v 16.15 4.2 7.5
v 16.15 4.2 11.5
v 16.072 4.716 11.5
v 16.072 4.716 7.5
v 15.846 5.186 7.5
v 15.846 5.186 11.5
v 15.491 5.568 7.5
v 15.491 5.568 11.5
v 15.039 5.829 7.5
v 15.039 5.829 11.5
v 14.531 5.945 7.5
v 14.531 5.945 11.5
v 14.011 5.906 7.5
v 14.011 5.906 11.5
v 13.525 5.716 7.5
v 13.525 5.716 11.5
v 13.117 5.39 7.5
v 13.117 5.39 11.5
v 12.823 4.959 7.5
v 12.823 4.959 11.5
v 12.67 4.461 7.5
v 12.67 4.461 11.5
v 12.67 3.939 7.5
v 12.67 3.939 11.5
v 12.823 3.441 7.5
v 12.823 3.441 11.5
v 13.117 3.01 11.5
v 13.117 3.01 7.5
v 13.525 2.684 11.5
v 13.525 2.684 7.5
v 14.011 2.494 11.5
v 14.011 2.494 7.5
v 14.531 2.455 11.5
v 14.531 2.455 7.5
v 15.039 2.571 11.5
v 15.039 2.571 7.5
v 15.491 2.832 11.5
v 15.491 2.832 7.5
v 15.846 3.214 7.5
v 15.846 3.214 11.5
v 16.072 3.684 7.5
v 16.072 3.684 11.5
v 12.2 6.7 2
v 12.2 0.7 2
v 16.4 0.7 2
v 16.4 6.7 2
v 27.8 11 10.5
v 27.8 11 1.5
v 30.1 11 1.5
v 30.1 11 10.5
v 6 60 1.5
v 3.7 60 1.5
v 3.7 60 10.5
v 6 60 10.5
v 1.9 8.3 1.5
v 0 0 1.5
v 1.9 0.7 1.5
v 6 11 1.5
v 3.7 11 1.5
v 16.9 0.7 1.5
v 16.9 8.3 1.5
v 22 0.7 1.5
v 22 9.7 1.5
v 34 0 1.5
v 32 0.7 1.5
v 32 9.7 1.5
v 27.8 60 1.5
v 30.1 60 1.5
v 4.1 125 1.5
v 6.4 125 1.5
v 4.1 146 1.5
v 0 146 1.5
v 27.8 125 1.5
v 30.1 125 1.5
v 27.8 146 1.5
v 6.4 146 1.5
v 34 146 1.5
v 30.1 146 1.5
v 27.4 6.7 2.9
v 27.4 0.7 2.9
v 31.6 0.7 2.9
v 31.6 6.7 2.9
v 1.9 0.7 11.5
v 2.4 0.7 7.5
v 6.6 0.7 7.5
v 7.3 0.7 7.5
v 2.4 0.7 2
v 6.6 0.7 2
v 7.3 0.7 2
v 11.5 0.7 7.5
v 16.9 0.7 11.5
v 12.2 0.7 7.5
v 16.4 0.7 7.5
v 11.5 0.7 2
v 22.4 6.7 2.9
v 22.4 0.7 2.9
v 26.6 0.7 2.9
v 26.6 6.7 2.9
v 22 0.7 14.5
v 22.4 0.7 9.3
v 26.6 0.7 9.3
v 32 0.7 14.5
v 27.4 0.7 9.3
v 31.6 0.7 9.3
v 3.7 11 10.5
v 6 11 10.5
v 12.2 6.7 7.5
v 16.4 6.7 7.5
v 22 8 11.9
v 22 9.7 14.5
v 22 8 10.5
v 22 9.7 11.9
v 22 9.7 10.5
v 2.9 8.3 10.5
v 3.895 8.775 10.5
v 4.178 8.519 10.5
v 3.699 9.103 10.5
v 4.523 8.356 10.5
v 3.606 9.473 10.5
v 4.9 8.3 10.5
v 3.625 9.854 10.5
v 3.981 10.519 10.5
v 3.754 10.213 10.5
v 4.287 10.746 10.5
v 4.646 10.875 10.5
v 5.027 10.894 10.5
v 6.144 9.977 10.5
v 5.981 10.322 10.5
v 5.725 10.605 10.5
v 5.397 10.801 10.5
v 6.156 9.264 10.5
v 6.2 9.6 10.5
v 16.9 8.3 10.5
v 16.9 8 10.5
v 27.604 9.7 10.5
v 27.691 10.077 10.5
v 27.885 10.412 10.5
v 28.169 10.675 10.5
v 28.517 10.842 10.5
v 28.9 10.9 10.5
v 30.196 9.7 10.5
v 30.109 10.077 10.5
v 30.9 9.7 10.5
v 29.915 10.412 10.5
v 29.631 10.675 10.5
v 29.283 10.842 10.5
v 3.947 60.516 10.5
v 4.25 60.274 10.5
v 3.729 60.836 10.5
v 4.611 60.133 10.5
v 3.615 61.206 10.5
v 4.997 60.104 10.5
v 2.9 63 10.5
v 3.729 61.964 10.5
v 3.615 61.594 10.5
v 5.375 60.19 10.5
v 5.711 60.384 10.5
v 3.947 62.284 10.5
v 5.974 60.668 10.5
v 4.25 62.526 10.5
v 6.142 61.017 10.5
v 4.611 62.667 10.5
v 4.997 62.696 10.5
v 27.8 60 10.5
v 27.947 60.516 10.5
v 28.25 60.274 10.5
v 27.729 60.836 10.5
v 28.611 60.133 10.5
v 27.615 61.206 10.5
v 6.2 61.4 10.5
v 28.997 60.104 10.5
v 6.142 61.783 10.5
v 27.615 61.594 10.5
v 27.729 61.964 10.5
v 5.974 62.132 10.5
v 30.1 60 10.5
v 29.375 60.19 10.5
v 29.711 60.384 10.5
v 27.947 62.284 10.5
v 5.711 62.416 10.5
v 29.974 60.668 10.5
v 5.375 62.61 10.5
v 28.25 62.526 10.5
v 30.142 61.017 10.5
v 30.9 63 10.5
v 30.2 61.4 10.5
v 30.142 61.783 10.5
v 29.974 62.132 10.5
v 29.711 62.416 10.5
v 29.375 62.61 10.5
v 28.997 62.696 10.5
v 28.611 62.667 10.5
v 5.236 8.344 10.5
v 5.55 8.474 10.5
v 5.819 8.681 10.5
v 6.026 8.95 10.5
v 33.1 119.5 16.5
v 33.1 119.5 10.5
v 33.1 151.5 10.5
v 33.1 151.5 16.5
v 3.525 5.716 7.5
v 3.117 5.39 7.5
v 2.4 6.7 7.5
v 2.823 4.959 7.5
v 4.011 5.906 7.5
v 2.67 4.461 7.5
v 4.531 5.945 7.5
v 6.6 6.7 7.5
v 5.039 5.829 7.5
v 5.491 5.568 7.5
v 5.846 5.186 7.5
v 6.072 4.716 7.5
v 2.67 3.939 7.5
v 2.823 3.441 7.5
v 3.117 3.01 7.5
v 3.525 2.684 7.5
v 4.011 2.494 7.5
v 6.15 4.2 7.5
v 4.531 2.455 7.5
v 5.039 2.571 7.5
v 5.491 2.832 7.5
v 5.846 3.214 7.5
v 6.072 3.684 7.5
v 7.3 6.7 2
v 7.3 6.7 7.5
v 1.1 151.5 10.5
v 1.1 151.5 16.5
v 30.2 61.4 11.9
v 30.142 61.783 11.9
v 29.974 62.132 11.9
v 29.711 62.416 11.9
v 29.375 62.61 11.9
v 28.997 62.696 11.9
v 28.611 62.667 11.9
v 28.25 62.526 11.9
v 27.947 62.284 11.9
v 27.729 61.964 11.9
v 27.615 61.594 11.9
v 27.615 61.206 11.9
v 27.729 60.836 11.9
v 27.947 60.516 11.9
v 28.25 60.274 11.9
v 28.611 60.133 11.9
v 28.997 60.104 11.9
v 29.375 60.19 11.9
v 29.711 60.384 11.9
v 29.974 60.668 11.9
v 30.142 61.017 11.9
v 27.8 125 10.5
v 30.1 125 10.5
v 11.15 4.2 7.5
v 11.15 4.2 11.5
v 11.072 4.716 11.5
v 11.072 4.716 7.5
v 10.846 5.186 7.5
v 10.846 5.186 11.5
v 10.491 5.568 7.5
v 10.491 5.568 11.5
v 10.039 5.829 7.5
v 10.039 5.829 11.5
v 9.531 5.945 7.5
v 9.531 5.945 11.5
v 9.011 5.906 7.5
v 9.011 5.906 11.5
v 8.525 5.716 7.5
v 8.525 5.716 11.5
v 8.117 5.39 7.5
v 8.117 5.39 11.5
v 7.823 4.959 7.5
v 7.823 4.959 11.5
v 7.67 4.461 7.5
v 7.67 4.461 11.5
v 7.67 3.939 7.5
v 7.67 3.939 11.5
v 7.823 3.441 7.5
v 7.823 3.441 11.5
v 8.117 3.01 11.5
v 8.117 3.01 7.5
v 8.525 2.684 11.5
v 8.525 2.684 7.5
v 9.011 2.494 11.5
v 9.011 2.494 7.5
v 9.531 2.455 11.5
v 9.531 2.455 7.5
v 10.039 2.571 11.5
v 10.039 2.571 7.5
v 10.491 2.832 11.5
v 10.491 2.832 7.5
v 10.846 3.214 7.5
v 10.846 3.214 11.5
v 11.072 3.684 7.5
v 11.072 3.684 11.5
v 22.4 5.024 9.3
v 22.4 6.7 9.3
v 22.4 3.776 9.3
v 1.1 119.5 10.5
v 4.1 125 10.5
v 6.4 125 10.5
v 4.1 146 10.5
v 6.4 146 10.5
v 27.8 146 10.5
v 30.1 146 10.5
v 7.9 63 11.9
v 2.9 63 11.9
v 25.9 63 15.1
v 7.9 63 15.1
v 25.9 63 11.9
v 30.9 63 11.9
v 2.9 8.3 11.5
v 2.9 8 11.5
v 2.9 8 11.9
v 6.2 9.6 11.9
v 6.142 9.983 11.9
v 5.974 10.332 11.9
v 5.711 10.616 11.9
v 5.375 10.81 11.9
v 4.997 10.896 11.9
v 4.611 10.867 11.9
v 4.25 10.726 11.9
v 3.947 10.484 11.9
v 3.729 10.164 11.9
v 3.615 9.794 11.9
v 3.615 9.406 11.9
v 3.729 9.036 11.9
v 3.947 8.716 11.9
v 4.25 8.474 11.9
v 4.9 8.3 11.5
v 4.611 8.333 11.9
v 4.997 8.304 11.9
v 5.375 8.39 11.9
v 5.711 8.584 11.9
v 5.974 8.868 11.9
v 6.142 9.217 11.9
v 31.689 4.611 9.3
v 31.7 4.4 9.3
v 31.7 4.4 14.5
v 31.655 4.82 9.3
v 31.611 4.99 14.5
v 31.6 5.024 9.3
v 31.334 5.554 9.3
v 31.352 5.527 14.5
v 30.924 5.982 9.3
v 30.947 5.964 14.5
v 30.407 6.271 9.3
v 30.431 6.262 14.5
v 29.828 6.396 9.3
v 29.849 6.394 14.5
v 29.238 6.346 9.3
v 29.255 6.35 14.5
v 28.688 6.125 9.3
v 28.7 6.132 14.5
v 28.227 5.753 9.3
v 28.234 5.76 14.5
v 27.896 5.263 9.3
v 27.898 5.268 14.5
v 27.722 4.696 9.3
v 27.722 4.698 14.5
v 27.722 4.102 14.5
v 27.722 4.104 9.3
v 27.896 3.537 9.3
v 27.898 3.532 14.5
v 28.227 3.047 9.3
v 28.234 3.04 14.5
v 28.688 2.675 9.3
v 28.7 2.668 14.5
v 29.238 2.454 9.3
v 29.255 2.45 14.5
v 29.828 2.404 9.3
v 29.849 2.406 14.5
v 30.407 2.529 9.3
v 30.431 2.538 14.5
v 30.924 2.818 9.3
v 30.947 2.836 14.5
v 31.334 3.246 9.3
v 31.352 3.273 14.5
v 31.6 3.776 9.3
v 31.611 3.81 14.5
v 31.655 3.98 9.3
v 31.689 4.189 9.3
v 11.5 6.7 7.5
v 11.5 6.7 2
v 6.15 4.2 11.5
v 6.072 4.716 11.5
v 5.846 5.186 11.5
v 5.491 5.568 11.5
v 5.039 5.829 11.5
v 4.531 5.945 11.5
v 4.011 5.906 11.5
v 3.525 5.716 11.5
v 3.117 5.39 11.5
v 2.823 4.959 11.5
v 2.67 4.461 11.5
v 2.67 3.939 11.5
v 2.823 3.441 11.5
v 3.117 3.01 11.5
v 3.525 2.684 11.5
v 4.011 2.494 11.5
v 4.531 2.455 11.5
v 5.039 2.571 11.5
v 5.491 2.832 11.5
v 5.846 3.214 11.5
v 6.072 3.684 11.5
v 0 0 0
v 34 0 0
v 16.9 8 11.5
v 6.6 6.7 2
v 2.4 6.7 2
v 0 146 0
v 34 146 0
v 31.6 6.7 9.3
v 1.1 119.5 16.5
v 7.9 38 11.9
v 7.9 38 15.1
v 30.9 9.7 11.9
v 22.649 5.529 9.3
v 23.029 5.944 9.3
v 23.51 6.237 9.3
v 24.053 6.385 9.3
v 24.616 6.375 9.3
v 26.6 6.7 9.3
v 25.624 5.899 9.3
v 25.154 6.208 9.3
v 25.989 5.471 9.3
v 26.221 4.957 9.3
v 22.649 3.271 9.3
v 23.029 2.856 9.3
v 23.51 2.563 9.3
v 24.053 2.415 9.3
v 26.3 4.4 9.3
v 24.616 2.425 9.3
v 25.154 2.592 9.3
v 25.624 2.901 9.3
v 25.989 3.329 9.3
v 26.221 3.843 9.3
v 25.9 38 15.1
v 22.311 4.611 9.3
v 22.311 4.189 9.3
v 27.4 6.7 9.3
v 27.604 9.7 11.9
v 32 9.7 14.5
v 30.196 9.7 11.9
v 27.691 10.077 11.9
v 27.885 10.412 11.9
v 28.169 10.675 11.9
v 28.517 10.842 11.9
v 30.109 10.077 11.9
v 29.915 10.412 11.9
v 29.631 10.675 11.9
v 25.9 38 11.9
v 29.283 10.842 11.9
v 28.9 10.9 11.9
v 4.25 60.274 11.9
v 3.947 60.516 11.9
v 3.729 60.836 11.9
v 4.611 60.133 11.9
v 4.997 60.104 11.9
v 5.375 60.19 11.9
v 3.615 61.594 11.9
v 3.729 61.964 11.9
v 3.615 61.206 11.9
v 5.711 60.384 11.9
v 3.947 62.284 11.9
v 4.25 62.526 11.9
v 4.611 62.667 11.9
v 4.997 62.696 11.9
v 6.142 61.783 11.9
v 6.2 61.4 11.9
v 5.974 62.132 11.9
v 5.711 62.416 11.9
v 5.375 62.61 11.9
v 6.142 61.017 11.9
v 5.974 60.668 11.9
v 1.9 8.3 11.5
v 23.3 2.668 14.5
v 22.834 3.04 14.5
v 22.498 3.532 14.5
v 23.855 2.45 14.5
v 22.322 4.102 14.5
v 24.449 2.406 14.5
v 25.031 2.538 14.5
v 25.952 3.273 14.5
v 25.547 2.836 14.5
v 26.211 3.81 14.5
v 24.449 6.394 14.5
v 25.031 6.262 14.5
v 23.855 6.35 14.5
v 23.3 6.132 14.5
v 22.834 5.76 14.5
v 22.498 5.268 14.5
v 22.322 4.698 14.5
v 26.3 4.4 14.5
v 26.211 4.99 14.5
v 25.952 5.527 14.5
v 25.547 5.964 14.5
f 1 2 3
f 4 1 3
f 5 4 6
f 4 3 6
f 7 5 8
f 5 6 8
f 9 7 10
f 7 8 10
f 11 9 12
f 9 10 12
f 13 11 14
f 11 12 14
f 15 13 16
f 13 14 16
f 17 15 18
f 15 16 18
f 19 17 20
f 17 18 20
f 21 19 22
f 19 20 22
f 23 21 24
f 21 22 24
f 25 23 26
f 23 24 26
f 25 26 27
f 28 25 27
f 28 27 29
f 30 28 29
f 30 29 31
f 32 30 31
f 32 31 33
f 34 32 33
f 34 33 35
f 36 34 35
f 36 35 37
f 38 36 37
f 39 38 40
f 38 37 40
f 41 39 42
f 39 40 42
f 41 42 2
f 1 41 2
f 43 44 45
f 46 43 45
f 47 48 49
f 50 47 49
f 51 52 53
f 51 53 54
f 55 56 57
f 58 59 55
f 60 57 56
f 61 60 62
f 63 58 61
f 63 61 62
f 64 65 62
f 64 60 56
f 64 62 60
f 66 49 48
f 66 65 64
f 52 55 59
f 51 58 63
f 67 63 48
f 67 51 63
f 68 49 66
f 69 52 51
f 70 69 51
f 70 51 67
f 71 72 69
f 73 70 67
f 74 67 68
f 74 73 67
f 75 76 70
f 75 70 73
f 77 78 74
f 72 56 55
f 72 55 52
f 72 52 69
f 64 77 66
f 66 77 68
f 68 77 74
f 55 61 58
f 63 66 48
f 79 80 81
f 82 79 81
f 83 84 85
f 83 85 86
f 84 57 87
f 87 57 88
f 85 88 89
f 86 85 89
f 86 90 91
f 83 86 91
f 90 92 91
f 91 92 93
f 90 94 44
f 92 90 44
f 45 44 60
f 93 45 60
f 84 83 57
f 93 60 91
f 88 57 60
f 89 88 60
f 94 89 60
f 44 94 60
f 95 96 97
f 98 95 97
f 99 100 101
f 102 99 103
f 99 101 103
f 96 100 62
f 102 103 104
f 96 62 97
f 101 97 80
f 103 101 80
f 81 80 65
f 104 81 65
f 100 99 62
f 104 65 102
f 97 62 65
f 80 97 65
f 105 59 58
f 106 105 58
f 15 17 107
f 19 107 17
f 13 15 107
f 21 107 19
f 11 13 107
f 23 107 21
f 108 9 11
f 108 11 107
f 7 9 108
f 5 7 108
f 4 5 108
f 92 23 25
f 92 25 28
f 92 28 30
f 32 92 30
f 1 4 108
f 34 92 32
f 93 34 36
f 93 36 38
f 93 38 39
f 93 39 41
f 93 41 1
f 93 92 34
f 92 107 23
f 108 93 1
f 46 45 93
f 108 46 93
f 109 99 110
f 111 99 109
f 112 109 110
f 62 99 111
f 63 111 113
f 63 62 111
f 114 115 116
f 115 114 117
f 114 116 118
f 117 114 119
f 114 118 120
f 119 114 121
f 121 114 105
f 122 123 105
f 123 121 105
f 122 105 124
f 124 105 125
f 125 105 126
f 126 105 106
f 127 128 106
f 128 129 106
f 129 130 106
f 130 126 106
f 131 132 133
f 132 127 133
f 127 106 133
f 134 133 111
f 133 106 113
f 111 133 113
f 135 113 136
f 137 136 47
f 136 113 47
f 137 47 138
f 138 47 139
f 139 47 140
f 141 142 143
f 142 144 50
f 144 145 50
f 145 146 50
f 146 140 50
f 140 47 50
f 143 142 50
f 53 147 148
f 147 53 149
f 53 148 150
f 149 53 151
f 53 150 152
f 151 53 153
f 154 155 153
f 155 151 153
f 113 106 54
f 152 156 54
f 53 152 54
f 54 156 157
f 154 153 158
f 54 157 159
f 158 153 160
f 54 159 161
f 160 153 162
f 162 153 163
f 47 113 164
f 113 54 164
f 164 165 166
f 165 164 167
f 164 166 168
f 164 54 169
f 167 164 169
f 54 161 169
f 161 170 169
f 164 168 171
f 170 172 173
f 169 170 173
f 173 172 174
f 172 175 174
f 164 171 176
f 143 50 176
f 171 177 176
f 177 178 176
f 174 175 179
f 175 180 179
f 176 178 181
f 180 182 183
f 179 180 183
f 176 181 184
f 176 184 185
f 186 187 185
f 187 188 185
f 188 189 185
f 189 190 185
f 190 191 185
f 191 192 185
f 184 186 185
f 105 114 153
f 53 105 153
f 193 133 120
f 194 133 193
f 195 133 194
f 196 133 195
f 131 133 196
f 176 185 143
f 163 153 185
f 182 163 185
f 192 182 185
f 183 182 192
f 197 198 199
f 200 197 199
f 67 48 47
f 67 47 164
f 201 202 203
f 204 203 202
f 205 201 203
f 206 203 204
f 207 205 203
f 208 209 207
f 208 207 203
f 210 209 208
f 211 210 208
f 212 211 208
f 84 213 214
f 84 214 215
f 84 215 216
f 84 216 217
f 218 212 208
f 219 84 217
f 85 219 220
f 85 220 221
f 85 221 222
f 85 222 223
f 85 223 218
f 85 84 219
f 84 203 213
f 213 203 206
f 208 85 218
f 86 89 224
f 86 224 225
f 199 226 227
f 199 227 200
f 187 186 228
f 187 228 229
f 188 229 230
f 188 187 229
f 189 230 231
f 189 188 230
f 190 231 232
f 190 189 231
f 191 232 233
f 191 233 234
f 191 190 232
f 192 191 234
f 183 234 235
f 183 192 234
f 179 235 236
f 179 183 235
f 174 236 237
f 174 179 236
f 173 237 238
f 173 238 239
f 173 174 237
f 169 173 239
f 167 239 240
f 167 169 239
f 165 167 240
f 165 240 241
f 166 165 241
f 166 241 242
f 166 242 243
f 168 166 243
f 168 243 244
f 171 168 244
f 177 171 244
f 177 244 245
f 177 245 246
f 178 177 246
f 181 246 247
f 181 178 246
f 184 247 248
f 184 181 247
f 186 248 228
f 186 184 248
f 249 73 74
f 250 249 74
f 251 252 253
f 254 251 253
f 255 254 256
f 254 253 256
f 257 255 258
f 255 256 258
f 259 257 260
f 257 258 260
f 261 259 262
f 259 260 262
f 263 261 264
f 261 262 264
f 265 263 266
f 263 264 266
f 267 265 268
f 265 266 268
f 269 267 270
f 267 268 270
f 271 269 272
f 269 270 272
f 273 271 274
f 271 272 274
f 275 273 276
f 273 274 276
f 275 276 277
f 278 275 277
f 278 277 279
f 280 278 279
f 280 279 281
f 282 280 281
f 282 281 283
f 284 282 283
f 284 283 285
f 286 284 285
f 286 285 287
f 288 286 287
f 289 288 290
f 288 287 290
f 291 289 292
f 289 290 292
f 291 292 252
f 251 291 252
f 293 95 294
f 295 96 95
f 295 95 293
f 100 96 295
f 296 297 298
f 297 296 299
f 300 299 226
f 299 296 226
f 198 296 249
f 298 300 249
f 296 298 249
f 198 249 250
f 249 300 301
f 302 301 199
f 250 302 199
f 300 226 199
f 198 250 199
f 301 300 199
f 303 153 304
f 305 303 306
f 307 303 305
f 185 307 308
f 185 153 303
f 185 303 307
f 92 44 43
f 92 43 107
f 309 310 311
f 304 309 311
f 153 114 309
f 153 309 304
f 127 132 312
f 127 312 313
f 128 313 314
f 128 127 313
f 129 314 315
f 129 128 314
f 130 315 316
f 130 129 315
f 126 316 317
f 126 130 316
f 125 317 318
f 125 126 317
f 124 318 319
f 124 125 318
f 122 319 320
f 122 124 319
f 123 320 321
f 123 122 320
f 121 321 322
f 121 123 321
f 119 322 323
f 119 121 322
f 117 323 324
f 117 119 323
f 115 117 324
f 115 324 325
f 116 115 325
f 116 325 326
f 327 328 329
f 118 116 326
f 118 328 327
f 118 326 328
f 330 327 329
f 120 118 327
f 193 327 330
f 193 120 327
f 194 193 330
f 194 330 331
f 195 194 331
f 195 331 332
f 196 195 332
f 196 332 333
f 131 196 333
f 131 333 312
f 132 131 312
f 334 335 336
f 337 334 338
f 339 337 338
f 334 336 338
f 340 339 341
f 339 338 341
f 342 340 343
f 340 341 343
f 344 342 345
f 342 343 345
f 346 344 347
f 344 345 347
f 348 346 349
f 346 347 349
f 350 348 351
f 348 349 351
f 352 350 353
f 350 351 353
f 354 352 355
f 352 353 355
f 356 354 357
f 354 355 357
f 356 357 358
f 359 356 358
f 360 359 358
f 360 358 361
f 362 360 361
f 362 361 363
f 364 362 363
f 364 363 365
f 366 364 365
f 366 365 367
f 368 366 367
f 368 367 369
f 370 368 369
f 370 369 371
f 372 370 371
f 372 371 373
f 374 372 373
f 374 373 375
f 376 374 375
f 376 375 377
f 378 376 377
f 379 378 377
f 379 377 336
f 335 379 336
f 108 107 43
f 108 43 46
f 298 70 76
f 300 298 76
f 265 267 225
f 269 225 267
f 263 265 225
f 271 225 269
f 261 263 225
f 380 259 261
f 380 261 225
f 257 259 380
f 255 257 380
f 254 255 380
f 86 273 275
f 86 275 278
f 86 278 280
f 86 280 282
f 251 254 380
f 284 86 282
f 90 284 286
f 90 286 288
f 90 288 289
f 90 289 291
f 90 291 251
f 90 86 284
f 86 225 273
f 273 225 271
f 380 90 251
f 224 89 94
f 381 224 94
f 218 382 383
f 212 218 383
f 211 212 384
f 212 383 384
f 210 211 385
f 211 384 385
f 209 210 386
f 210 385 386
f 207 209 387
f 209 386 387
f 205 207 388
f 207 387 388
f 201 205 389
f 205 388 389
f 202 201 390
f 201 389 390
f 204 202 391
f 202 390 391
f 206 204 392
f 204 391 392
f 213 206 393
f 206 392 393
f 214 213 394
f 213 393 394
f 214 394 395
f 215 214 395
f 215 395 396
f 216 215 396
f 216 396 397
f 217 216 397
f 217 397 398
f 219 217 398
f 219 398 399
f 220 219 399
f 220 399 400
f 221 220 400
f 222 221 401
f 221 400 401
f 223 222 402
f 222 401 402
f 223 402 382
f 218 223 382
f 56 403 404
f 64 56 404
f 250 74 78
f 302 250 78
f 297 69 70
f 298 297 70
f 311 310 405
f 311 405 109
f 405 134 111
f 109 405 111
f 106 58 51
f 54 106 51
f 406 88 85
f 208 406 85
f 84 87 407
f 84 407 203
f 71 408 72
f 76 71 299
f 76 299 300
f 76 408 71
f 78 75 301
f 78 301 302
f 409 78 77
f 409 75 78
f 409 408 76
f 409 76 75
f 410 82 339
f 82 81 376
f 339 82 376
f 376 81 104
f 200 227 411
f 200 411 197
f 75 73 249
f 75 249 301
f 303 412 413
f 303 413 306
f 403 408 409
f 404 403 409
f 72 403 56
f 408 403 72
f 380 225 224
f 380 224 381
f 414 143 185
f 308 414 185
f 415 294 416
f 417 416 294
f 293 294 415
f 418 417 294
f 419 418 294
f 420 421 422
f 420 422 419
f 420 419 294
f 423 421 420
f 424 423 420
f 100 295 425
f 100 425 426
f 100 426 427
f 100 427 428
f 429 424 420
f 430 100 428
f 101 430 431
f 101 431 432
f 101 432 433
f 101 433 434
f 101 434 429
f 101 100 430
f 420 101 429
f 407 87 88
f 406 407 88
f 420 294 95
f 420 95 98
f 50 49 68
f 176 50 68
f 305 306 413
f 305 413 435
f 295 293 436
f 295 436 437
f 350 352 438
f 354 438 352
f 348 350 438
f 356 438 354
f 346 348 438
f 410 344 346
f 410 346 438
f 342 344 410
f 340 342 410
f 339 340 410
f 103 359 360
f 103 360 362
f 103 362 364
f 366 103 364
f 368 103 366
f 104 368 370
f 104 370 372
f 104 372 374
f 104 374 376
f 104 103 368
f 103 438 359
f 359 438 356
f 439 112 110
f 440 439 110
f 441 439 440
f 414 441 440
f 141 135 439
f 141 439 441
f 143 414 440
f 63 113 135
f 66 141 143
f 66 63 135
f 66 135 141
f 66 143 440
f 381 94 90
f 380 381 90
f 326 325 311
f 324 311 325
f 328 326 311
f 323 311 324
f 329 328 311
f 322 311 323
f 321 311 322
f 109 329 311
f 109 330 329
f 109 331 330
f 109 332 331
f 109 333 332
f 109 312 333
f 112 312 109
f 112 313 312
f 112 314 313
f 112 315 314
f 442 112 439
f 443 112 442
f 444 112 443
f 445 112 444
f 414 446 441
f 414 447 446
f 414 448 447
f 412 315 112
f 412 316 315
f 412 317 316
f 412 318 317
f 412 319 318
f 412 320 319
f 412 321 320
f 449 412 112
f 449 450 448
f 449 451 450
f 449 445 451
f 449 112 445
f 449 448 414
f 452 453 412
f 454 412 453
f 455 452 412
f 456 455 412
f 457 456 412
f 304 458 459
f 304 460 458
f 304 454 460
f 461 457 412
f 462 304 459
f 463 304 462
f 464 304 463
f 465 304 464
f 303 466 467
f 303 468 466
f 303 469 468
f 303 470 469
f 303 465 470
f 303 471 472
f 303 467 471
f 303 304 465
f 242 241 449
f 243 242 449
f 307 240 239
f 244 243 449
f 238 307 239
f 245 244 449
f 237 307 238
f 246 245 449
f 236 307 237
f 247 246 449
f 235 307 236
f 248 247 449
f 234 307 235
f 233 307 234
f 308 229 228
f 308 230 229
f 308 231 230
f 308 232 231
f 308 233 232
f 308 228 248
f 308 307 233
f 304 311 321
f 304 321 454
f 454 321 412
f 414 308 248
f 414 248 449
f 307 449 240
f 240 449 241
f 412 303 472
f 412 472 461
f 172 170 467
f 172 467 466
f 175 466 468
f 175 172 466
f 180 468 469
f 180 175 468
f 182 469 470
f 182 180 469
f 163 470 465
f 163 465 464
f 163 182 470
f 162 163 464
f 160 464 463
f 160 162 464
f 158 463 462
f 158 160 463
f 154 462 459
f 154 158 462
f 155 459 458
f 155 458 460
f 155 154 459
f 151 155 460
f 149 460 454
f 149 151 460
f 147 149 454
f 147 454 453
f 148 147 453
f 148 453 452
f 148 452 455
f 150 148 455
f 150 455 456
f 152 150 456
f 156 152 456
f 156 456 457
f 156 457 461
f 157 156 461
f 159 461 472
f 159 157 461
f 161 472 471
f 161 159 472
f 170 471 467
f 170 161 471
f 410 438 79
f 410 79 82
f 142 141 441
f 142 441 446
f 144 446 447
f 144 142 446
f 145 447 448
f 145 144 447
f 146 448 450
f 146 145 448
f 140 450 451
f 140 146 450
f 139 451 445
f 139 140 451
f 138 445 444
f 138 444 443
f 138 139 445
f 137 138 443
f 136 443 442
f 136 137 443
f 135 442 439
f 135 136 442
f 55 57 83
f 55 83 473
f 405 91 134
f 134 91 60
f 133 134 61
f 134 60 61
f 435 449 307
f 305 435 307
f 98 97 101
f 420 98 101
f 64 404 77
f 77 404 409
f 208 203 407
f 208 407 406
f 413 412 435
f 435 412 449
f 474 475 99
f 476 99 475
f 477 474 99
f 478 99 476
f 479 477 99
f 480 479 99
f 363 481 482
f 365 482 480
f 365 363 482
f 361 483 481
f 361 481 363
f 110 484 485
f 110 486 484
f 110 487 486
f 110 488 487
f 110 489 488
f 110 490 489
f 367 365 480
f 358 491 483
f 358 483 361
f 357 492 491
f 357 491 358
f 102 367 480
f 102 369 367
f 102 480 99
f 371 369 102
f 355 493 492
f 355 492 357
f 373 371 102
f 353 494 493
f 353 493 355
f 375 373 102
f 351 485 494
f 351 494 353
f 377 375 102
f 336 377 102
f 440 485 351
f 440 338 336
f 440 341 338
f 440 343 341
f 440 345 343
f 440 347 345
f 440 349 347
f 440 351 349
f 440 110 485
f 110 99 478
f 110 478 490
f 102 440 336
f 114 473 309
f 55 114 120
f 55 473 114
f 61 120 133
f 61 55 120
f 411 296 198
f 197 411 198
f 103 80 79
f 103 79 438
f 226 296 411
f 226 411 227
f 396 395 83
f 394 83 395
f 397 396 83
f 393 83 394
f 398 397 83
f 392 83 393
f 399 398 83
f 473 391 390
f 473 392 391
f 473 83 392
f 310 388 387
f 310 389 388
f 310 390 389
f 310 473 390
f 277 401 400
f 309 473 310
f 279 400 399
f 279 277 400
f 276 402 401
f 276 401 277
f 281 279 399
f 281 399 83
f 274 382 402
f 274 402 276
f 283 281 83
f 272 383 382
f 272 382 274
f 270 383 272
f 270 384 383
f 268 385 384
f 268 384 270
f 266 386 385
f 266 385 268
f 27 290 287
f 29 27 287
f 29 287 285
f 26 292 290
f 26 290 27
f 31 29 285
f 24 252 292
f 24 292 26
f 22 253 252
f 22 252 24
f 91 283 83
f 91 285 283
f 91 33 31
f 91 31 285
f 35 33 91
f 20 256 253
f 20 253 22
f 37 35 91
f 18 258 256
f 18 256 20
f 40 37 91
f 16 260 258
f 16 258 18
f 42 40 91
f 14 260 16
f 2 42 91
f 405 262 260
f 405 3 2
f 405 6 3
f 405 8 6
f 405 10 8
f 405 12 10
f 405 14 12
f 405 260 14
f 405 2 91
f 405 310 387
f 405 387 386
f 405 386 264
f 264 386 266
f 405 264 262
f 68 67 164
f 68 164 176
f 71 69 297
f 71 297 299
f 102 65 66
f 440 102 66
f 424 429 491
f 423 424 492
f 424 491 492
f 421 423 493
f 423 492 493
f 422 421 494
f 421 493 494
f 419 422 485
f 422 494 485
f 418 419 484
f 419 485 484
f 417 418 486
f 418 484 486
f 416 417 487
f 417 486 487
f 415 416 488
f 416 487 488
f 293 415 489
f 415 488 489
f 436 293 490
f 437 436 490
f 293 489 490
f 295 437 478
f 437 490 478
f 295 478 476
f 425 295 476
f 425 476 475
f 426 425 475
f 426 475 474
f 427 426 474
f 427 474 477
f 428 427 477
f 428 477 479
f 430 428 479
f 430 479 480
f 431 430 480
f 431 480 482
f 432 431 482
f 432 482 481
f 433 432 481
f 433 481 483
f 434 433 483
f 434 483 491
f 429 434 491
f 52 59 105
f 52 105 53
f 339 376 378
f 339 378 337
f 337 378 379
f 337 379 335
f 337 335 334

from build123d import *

# Parameters (mm, degrees)
SKICA1_W                    = 34
SKICA1_H                    = 146
PCB_DEPTH                   = 1.5
SKICA2_W                    = 10
SKICA2_H                    = 9
T_LO_DEPTH                  = 13
SKICA3_W                    = 4.2
SKICA3_H                    = 6.4
D_RA_NA_DR_TKY_DEPTH        = 6
SKICA4_R                    = 2
D_RY_NA_ROUBKY_DEPTH        = 5.2
SKICA5_W                    = 15
SKICA5_H                    = 7.6
T_LO_LOGIKY_KONEKTORU_DEPTH = 10
SKICA6_W                    = 4.2
SKICA6_H                    = 5.5
D_RY_NA_DR_TKY_DEPTH        = 6
SKICA7_R                    = 1.75
D_RY_NA_KOUBKY_DEPTH        = 4
SKICA8_W                    = 2.3
SKICA8_H                    = 49
LI_TY_DEPTH                 = 9
SKICA9_W                    = 28
SKICA9_H                    = 55
SKICA9_R                    = 1.3
PCB_ESP32_BOARD_DEPTH       = 1.4
SKICA10_W                   = 18
SKICA10_H                   = 25
CHIP_ESP32_DEPTH            = 3.2
SKICA11_W                   = 2.3
SKICA11_H                   = 21
LISTY_DEPTH                 = 9
SKICA12_W                   = 32
SKICA12_H                   = 32
F_8X8_LED_MATICE_DEPTH      = 6


with BuildPart() as part:
    # Skica1 → PCB (new body)
    with BuildSketch(Plane.XY):
        with Locations((17, 73)):
            Rectangle(SKICA1_W, SKICA1_H)
    extrude(amount=PCB_DEPTH)

    # Skica2 → tělo (add)
    with BuildSketch(Plane.XY.offset(1.5)):
        with Locations((27, 5.2)):
            Rectangle(SKICA2_W, SKICA2_H)
    extrude(amount=T_LO_DEPTH)

    # Skica3 → díra na drátky (cut)
    with BuildSketch(Plane.XZ.offset(-0.7)):
        with Locations((24.5, 6.1)):
            Rectangle(SKICA3_W, SKICA3_H)
        with Locations((29.5, 6.1)):
            Rectangle(SKICA3_W, SKICA3_H)
    extrude(amount=-D_RA_NA_DR_TKY_DEPTH, mode=Mode.SUBTRACT)

    # Skica4 → díry na šroubky (cut)
    with BuildSketch(Plane.XY.offset(14.5)):
        with Locations((29.7, 4.4)):
            Circle(SKICA4_R)
        with Locations((24.3, 4.4)):
            Circle(SKICA4_R)
    extrude(amount=-D_RY_NA_ROUBKY_DEPTH, mode=Mode.SUBTRACT)

    # Skica5 → tělo logiky konektoru (add)
    with BuildSketch(Plane.XY.offset(1.5)):
        with Locations((9.4, 4.5)):
            Rectangle(SKICA5_W, SKICA5_H)
    extrude(amount=T_LO_LOGIKY_KONEKTORU_DEPTH)

    # Skica6 → díry na drátky (cut)
    with BuildSketch(Plane.XZ.offset(-0.7)):
        with Locations((4.5, 4.75)):
            Rectangle(SKICA6_W, SKICA6_H)
        with Locations((9.4, 4.75)):
            Rectangle(SKICA6_W, SKICA6_H)
        with Locations((14.3, 4.75)):
            Rectangle(SKICA6_W, SKICA6_H)
    extrude(amount=-D_RY_NA_DR_TKY_DEPTH, mode=Mode.SUBTRACT)

    # Skica7 → díry na škoubky (cut)
    with BuildSketch(Plane.XY.offset(11.5)):
        with Locations((4.4, 4.2)):
            Circle(SKICA7_R)
        with Locations((9.4, 4.2)):
            Circle(SKICA7_R)
        with Locations((14.4, 4.2)):
            Circle(SKICA7_R)
    extrude(amount=-D_RY_NA_KOUBKY_DEPTH, mode=Mode.SUBTRACT)

    # Skica8 → lišty (add)
    with BuildSketch(Plane.XY.offset(1.5)):
        with Locations((4.85, 35.5)):
            Rectangle(SKICA8_W, SKICA8_H)
        with Locations((28.95, 35.5)):
            Rectangle(SKICA8_W, SKICA8_H)
    extrude(amount=LI_TY_DEPTH)



with BuildPart() as body_2:
    # Skica9 → PCB ESP32 board (new body)
    with BuildSketch(Plane.XY.offset(10.5)):
        with Locations((16.9, 35.5)):
            Rectangle(SKICA9_W, SKICA9_H)
        with Locations((28.9, 61.4)):
            Circle(SKICA9_R, mode=Mode.SUBTRACT)
        with Locations((4.9, 61.4)):
            Circle(SKICA9_R, mode=Mode.SUBTRACT)
        with Locations((4.9, 9.6)):
            Circle(SKICA9_R, mode=Mode.SUBTRACT)
        with Locations((28.9, 9.6)):
            Circle(SKICA9_R, mode=Mode.SUBTRACT)
    extrude(amount=PCB_ESP32_BOARD_DEPTH)


with BuildPart() as part_1:
    add(part.part)

    add(body_2.part)  # chip ESP32 merges body 2
    # Skica10 → chip ESP32 (add)
    with BuildSketch(Plane.XY.offset(11.9)):
        with Locations((16.9, 50.5)):
            Rectangle(SKICA10_W, SKICA10_H)
    extrude(amount=CHIP_ESP32_DEPTH)

    # Skica11 → listy (add)
    with BuildSketch(Plane.XY.offset(1.5)):
        with Locations((28.95, 135.5)):
            Rectangle(SKICA11_W, SKICA11_H)
        with Locations((5.25, 135.5)):
            Rectangle(SKICA11_W, SKICA11_H)
    extrude(amount=LISTY_DEPTH)

    # Skica12 → 8x8 LED matice (add)
    with BuildSketch(Plane.XY.offset(10.5)):
        with Locations((17.1, 135.5)):
            Rectangle(SKICA12_W, SKICA12_H)
    extrude(amount=F_8X8_LED_MATICE_DEPTH)


solid = part_1.part
